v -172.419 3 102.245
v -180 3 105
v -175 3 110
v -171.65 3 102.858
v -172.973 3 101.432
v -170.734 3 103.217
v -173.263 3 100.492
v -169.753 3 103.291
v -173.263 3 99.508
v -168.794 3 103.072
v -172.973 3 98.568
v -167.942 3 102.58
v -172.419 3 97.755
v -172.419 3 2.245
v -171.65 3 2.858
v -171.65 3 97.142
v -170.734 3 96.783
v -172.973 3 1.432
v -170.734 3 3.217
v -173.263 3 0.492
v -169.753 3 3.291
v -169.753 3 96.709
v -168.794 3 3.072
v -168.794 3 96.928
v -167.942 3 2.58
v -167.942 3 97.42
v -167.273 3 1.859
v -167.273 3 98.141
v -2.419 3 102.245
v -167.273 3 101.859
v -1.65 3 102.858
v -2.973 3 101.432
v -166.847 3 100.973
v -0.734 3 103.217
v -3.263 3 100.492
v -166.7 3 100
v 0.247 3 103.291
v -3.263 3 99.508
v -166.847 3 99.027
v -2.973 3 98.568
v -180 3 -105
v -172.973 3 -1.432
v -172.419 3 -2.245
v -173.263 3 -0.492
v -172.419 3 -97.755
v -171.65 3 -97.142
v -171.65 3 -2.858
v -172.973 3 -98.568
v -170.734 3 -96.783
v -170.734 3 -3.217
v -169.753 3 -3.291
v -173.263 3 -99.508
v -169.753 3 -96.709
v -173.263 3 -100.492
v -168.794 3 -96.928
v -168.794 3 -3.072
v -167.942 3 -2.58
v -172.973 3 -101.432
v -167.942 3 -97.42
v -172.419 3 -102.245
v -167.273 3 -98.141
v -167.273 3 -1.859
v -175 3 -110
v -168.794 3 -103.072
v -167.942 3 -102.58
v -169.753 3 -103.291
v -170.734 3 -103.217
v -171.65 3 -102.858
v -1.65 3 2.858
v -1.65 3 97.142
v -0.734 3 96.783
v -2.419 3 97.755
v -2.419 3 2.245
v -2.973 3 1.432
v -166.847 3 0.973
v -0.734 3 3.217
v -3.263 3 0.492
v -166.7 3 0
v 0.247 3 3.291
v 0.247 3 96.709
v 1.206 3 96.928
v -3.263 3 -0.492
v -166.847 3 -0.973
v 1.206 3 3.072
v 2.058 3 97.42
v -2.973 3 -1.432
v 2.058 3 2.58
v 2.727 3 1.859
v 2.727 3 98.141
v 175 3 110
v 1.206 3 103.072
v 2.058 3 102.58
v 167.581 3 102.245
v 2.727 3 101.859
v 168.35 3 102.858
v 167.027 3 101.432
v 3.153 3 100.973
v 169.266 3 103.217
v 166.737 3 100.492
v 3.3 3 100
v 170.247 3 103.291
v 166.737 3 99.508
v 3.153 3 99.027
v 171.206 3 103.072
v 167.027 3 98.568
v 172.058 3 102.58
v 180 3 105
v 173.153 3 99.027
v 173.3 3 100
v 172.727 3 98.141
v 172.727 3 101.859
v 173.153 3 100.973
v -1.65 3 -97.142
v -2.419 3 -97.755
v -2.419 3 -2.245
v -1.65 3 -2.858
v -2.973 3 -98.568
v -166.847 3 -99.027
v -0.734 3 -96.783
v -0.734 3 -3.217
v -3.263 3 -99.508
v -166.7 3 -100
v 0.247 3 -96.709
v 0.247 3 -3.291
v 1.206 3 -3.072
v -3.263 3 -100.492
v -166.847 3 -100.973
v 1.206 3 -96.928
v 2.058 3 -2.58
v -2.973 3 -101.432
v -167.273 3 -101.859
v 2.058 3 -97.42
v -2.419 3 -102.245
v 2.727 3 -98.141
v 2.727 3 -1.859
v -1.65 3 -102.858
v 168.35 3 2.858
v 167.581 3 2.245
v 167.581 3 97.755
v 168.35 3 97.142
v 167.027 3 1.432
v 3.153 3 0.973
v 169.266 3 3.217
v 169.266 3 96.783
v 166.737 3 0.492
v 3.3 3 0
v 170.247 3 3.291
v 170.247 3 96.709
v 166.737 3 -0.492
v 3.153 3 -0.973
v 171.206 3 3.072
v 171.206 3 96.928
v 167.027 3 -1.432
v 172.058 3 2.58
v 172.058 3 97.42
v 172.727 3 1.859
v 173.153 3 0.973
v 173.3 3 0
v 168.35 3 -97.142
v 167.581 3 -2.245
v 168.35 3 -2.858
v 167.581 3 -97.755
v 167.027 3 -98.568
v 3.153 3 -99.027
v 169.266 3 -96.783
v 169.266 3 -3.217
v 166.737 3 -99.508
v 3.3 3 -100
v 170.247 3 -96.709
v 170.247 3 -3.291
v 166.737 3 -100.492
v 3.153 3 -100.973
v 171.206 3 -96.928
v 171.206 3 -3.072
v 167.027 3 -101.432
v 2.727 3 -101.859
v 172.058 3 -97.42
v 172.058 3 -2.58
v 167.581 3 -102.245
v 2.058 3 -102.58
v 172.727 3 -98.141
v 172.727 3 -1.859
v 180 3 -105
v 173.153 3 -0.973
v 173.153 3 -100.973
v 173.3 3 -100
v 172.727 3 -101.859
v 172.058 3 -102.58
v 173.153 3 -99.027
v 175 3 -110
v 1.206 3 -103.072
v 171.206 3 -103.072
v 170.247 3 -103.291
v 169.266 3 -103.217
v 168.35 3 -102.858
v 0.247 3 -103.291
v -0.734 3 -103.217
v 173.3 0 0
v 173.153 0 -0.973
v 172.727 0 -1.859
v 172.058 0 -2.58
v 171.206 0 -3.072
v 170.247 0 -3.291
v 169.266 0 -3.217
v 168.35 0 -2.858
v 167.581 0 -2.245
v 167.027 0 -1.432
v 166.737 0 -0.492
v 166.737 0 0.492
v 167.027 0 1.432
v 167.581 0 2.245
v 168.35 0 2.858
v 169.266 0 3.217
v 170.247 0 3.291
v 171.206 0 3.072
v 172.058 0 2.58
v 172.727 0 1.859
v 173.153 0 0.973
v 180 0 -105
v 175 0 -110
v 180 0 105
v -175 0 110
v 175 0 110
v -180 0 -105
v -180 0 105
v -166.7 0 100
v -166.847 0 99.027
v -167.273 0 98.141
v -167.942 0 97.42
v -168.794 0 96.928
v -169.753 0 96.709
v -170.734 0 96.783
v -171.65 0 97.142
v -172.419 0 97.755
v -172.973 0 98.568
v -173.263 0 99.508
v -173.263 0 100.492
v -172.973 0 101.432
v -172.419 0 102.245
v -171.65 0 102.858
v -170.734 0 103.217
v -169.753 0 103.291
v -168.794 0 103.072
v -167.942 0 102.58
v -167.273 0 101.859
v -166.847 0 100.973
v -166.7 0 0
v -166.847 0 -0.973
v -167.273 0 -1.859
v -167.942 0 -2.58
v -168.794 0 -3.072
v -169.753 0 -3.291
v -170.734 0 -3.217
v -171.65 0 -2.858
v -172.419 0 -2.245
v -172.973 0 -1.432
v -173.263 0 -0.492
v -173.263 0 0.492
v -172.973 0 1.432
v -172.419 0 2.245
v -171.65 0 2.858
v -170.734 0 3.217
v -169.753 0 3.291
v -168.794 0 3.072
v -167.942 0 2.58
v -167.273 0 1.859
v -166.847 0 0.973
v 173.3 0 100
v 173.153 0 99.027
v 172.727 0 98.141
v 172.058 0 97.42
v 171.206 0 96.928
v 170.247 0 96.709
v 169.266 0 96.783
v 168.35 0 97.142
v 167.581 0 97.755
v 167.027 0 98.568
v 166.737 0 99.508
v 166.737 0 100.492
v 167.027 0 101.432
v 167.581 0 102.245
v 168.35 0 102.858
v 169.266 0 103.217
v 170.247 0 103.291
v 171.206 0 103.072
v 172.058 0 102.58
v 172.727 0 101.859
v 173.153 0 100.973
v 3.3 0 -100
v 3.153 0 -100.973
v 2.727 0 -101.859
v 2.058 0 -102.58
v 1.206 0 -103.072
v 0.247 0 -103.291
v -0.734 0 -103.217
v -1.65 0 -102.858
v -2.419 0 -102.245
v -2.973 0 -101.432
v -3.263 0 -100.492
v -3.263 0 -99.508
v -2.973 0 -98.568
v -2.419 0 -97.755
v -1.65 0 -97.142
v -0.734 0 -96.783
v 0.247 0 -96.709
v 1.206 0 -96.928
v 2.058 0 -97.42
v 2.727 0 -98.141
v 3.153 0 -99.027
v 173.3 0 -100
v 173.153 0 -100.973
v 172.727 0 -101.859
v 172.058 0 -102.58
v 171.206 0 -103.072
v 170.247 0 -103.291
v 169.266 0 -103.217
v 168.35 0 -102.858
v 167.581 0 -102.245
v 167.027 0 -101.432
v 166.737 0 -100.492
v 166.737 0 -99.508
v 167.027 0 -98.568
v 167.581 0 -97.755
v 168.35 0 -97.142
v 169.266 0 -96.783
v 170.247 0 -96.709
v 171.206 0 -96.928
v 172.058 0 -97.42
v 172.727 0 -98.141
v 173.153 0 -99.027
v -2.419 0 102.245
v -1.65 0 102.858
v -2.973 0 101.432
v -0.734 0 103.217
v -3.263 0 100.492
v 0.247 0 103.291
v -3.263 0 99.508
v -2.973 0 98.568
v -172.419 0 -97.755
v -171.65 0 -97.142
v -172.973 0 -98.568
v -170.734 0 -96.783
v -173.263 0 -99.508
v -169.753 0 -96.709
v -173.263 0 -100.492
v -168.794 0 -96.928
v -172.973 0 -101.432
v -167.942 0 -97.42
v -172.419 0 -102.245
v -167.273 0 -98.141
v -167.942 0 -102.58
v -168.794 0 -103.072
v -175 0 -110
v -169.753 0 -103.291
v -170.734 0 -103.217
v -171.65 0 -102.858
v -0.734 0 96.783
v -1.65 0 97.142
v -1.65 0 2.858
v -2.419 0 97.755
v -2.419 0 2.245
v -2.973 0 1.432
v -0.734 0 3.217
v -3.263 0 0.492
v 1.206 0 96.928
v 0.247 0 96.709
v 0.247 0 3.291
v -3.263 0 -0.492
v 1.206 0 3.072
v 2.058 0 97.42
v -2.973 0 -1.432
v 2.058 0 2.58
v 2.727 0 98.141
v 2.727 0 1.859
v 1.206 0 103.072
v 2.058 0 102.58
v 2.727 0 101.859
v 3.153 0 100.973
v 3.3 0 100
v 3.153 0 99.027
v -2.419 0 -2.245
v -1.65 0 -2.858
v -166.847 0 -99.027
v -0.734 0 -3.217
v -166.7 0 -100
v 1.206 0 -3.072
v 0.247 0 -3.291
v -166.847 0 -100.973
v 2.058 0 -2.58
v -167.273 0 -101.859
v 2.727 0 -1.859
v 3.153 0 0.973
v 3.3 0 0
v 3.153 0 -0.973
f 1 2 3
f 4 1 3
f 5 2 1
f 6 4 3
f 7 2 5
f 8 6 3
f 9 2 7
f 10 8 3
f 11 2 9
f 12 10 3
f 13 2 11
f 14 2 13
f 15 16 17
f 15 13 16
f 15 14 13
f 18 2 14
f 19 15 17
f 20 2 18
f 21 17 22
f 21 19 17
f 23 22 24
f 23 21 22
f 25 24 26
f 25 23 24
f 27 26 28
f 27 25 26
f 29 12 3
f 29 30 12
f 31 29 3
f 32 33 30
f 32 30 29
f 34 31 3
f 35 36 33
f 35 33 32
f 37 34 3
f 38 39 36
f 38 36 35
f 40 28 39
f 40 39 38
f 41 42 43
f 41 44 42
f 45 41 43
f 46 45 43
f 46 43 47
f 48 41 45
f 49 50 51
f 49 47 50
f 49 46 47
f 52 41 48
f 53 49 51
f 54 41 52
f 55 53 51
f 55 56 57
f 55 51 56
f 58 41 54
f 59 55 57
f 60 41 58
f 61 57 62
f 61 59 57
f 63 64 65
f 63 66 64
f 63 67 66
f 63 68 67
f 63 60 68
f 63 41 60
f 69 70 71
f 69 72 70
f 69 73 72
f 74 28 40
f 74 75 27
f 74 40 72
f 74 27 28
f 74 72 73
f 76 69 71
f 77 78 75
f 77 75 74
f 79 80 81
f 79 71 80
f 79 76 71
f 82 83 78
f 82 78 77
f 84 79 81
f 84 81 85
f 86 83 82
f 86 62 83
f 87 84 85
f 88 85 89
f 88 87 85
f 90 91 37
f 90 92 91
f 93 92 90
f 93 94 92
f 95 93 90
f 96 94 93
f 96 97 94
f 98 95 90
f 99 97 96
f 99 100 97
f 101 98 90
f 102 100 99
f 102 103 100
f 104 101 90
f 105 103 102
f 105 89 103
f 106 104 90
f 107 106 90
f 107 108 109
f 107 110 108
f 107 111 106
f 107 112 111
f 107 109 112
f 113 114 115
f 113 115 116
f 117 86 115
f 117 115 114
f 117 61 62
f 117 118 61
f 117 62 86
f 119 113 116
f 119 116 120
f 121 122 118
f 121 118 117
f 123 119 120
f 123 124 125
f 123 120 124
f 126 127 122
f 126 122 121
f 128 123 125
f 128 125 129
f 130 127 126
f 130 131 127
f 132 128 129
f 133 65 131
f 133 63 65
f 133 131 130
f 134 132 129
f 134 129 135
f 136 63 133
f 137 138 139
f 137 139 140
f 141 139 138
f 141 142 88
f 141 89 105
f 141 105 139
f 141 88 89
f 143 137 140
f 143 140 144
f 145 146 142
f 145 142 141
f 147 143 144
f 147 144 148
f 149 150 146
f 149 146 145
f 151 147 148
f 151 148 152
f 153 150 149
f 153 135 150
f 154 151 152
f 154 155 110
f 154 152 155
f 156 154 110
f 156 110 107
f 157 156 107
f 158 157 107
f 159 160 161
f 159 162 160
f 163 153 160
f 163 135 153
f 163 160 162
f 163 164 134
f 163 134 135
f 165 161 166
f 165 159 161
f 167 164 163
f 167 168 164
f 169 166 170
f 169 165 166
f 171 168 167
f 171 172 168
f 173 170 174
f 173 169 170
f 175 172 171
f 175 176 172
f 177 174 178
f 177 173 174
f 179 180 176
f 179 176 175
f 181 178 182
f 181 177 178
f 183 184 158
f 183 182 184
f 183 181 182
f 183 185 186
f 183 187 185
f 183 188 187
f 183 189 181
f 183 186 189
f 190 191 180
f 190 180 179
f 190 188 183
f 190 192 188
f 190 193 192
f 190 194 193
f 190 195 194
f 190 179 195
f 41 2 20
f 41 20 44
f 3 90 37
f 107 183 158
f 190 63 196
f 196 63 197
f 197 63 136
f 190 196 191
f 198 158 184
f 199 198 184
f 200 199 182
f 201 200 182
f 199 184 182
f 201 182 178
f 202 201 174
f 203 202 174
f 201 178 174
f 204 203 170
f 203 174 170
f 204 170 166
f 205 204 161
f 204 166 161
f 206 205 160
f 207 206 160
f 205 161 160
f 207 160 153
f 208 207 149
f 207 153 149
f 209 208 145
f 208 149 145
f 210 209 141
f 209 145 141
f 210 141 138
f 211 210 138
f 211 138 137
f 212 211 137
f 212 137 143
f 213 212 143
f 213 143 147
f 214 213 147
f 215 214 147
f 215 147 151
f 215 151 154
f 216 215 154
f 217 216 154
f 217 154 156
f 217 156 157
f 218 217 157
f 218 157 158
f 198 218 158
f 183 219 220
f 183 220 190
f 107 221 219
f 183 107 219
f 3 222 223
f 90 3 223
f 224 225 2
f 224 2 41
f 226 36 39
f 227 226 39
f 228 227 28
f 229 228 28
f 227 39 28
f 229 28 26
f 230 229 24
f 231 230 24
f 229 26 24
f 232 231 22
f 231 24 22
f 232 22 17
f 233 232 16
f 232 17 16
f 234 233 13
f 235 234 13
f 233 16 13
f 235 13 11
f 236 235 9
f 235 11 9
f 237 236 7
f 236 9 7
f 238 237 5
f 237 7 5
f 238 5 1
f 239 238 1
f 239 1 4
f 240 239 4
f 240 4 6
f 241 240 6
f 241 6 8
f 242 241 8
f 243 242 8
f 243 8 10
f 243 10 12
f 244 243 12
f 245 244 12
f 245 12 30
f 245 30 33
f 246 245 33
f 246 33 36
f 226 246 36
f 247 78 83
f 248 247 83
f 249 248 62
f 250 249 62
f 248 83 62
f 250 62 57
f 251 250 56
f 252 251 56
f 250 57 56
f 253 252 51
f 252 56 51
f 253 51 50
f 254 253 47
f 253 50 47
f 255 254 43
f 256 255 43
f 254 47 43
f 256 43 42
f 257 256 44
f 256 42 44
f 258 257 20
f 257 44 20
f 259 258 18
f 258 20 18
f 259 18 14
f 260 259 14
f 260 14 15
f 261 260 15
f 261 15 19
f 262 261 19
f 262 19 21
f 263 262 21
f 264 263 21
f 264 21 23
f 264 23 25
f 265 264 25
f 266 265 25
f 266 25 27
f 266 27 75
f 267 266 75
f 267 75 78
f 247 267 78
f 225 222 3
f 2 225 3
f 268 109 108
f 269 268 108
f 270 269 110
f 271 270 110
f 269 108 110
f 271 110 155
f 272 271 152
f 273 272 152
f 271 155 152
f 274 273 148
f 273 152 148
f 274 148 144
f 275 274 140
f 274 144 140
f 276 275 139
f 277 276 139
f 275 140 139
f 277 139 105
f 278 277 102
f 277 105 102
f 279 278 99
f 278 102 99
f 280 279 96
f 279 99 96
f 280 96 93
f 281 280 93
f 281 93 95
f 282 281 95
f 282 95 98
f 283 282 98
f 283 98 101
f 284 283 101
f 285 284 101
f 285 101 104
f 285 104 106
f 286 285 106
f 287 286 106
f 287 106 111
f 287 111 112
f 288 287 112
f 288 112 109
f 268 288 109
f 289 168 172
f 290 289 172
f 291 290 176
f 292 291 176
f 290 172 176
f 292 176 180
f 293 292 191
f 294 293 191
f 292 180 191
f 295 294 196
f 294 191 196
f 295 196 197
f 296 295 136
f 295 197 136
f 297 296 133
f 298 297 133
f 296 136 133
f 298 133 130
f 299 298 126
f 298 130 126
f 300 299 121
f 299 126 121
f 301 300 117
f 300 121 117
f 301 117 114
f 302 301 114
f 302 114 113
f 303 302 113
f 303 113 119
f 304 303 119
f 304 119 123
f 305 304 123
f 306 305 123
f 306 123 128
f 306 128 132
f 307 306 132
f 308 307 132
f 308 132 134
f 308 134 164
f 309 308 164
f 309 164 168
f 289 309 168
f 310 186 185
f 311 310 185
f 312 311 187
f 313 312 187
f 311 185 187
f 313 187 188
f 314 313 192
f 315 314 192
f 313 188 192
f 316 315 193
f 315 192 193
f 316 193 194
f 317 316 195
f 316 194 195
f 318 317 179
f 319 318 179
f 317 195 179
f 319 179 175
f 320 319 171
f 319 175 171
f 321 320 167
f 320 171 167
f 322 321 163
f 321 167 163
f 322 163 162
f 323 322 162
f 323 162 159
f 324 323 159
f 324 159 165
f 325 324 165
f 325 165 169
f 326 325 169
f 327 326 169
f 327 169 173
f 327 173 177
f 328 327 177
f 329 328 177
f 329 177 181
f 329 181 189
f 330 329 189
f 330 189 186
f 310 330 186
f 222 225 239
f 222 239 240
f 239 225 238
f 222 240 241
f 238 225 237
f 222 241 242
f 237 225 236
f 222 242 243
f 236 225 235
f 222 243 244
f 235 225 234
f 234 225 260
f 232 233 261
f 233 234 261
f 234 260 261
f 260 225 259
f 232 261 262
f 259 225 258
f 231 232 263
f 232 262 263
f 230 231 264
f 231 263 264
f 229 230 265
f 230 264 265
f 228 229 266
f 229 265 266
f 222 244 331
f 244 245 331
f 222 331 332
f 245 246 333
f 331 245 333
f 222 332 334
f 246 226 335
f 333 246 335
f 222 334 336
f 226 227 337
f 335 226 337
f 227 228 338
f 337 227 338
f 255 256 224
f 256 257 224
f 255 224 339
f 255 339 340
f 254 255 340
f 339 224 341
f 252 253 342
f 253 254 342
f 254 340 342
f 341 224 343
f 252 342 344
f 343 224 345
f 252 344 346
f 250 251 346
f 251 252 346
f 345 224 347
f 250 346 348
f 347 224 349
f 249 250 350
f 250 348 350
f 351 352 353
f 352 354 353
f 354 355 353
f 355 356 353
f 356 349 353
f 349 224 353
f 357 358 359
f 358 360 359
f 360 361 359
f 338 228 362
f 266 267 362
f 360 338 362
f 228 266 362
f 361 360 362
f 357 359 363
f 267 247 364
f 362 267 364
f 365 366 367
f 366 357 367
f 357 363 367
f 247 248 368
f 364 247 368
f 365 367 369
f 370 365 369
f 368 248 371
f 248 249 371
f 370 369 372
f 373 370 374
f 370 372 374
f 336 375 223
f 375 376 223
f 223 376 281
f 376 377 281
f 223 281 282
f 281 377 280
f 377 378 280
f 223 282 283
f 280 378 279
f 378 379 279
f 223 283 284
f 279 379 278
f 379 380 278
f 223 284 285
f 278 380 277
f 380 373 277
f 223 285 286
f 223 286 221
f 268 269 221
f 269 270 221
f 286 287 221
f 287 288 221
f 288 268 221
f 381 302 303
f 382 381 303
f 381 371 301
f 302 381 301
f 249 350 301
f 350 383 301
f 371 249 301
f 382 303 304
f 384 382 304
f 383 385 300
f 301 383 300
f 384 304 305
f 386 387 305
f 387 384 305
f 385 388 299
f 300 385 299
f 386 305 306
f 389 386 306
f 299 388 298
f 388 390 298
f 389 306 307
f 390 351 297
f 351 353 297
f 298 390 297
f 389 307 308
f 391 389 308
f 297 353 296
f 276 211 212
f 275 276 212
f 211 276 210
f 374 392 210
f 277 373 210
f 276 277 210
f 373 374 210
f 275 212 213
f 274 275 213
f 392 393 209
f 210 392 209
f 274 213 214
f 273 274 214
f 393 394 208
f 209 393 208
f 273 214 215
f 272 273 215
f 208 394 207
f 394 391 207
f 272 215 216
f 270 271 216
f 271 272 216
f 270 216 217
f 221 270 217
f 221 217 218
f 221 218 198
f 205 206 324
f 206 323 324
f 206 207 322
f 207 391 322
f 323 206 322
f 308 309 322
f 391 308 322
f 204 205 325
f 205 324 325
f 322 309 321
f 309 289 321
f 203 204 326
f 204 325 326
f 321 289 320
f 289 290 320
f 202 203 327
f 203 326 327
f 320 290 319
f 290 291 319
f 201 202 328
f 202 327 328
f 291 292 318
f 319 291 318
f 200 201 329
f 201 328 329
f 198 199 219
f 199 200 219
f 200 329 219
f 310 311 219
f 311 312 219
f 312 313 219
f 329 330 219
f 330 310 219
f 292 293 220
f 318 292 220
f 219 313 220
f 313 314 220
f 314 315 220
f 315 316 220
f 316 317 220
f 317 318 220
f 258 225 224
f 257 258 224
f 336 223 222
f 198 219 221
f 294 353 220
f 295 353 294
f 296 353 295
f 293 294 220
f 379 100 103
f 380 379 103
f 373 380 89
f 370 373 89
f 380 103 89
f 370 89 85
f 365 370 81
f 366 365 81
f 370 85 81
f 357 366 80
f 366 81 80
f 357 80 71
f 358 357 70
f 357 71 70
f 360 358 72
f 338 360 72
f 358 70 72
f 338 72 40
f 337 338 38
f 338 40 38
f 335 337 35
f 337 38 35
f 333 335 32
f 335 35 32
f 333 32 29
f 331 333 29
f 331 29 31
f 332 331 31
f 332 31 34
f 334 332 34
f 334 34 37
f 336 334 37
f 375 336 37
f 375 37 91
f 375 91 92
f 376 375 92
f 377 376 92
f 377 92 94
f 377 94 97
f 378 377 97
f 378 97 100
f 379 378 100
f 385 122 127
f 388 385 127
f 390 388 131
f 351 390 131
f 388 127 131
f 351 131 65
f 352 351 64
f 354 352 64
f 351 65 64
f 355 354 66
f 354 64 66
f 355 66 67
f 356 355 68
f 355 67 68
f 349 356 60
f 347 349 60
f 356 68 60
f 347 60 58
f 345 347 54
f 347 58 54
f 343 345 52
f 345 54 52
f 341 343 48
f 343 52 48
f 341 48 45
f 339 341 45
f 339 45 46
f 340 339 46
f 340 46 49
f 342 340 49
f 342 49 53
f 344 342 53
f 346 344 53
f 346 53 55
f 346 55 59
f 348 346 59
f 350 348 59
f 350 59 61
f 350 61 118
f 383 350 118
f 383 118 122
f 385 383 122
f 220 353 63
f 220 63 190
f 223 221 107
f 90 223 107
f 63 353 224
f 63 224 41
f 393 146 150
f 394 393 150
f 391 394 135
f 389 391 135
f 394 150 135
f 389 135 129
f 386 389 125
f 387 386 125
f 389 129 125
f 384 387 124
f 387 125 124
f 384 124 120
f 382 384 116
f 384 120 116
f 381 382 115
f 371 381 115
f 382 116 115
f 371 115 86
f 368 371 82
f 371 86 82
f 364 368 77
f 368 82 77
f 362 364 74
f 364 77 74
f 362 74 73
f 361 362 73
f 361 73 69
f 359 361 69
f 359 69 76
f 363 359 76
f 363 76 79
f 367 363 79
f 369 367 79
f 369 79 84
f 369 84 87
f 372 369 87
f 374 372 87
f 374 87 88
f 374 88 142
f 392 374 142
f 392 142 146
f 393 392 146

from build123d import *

# Parameters (mm, degrees)
ESQUISSE1_W          = 360
ESQUISSE1_H          = 220
BOSS_EXTRU_1_DEPTH   = 3
M6_CLEARANCE_HOLE1_D = 6.6
CHAMFER1_SIZE        = 5


with BuildPart() as part:
    # Esquisse1 → Boss.-Extru.1 (new body)
    with BuildSketch(Plane(origin=(0, 0, 0), x_dir=(1, 0, 0), z_dir=(0, 1, 0))):
        Rectangle(ESQUISSE1_W, ESQUISSE1_H)
    extrude(amount=BOSS_EXTRU_1_DEPTH)

    # M6 Clearance Hole1 (through all)
    with Locations(Plane(origin=(0, 0, 0), x_dir=(-1, 0, 0), z_dir=(0, -1, 0))):
        with Locations((-170, 100), (0, 100), (170, 100), (0, 0), (170, 0), (0, -100), (170, -100), (-170, 0), (-170, -100)):
            Hole(M6_CLEARANCE_HOLE1_D / 2)

    # Chamfer1
    chamfer1_edges = [part.edges().sort_by_distance(p)[0] for p in [
        (180, 1.5, 110),
        (-180, 1.5, 110),
        (-180, 1.5, -110),
        (180, 1.5, -110),
    ]]
    chamfer(chamfer1_edges, length=CHAMFER1_SIZE)


solid = part.part
